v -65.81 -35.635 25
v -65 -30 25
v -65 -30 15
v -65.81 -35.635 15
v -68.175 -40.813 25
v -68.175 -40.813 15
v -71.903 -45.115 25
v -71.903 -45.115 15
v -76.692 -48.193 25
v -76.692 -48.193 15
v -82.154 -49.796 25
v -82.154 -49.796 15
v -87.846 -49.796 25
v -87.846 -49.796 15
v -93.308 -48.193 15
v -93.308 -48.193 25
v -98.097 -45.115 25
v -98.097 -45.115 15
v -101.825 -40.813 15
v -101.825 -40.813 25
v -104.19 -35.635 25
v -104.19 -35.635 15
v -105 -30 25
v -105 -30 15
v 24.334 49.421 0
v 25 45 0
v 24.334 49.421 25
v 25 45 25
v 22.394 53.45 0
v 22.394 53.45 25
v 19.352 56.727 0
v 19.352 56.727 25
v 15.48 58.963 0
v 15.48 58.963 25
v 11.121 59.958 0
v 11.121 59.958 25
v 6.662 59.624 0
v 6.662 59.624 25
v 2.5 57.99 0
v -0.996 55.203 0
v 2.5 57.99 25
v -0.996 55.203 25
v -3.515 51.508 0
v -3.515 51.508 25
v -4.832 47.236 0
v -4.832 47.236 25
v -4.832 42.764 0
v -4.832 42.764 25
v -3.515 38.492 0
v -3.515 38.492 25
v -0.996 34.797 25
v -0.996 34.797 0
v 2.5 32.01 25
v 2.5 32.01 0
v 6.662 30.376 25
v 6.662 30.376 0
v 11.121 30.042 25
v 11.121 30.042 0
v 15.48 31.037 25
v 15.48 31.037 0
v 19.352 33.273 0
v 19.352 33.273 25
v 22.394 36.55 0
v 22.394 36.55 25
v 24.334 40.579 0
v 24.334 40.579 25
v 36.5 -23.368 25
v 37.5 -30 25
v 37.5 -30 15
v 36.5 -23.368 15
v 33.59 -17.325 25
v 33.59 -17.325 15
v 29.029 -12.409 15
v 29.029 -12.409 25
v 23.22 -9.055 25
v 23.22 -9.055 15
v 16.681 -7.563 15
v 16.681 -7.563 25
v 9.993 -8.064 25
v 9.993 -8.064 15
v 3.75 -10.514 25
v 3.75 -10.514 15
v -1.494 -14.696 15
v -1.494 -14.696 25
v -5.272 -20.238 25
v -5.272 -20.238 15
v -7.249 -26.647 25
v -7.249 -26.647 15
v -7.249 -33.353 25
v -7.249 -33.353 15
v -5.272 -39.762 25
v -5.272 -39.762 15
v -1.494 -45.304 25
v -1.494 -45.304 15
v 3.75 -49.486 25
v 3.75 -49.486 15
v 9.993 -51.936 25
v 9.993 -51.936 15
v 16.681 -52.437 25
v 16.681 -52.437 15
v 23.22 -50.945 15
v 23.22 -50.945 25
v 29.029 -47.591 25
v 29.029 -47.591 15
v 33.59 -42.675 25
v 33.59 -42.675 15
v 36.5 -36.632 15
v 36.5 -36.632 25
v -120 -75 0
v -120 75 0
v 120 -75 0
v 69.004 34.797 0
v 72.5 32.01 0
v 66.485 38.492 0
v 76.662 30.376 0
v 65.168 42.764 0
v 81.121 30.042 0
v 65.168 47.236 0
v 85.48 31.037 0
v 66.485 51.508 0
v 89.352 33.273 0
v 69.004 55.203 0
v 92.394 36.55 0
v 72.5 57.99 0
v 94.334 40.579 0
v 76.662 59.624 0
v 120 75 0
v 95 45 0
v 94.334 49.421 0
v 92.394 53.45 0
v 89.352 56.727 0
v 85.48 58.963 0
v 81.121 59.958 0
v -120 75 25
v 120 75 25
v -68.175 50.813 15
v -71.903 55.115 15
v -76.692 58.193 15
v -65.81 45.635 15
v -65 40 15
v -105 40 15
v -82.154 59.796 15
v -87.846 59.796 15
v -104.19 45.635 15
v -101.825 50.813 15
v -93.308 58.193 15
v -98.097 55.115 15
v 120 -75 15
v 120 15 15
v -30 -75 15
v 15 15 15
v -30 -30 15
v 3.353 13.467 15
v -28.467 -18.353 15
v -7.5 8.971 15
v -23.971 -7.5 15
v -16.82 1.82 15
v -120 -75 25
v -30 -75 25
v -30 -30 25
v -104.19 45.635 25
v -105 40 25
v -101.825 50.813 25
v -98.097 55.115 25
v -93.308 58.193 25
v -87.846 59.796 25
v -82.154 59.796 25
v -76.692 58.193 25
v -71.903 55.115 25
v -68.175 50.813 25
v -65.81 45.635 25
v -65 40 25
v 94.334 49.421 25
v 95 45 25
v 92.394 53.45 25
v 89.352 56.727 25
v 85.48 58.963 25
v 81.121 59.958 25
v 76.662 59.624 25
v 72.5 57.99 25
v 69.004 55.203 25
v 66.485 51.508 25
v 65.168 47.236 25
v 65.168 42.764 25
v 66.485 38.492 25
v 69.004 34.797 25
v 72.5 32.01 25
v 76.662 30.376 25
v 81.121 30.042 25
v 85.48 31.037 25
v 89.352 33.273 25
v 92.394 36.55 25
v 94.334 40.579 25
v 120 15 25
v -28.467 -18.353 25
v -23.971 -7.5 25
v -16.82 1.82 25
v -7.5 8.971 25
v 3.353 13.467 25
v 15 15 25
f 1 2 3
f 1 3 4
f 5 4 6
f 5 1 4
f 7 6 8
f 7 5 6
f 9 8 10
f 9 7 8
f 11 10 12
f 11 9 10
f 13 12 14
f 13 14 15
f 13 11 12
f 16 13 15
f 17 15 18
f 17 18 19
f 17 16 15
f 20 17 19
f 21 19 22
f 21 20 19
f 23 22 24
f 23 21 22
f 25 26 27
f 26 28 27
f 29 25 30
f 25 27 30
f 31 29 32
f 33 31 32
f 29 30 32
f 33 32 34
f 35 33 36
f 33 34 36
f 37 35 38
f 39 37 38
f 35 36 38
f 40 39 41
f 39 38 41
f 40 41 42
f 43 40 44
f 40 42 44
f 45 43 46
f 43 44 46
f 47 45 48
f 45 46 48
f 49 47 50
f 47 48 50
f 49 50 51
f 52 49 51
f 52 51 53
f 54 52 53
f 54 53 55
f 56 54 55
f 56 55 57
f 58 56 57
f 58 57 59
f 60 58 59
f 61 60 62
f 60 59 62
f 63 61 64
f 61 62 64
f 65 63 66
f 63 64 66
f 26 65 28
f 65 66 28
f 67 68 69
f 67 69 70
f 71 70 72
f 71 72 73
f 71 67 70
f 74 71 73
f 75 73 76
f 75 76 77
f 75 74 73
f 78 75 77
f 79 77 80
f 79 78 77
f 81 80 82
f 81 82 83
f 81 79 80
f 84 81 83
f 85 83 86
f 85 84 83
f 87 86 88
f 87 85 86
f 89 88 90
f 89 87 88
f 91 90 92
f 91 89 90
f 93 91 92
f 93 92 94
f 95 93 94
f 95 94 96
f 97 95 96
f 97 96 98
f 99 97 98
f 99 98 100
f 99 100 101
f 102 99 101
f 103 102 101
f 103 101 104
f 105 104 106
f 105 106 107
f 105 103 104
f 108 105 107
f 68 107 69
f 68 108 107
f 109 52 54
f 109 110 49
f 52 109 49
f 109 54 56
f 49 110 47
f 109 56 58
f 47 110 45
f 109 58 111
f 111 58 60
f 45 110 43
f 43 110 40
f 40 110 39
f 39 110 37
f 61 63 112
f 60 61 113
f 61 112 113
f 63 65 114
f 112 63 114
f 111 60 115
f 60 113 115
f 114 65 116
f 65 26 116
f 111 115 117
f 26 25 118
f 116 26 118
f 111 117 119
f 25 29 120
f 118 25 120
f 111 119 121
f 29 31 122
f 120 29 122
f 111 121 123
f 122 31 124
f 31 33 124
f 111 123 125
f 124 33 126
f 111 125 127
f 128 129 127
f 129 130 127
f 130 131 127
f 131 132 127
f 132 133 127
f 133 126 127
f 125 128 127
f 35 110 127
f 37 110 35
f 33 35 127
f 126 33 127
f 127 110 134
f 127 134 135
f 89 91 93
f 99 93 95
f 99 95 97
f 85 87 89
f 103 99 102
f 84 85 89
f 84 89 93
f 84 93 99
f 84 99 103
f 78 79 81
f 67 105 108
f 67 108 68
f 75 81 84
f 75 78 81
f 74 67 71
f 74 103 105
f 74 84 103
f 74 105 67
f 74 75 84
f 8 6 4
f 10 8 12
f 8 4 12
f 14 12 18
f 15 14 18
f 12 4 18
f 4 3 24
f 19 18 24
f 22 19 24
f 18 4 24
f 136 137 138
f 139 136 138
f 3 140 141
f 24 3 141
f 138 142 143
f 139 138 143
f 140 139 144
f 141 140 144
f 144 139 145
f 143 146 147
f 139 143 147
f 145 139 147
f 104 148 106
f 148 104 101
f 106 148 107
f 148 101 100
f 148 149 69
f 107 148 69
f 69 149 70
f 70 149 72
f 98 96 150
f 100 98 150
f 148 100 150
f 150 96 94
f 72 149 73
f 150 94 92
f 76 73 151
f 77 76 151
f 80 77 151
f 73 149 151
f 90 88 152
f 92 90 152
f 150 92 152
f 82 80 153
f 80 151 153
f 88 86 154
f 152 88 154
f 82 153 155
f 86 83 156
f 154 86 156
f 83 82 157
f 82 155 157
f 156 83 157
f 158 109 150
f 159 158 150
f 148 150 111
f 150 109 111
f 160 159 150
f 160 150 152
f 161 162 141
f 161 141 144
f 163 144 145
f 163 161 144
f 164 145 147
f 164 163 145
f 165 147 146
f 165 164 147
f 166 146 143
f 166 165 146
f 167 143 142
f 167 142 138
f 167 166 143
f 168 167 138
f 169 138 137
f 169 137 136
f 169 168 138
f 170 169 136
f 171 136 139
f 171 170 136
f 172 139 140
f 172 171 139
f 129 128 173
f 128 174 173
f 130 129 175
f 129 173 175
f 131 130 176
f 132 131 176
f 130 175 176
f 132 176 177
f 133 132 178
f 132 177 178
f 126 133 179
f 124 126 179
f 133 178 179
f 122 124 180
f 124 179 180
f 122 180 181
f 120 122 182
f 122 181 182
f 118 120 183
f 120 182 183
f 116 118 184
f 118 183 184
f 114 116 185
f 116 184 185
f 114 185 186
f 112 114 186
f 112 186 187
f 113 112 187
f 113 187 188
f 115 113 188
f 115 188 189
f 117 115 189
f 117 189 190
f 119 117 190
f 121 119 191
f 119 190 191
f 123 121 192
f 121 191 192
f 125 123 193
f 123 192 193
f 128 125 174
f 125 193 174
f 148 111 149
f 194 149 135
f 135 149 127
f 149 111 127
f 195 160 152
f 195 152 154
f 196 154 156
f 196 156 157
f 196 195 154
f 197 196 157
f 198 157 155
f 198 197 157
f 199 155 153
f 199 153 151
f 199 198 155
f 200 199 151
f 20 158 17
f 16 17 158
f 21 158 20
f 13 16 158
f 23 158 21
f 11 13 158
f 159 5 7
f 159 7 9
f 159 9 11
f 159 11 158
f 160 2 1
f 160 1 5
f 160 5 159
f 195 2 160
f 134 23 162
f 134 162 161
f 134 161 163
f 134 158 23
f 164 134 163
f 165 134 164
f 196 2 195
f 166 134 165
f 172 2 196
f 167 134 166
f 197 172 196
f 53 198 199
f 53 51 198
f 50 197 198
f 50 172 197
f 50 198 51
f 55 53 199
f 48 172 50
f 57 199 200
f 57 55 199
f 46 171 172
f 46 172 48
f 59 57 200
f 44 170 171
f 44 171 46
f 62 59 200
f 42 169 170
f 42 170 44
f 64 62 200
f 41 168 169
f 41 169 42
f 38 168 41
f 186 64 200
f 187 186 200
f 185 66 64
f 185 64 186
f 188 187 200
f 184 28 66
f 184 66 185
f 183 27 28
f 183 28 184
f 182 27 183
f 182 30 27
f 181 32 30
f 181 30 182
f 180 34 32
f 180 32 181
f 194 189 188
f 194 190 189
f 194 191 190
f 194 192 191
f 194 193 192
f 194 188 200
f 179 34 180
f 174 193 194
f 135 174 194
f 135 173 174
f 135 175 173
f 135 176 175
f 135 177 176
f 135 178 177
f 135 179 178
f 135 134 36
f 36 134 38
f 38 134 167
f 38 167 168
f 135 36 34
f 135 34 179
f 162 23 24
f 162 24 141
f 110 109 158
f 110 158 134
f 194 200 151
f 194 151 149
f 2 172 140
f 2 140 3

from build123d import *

# Parameters (mm, degrees)
SKETCH1_W           = 240
SKETCH1_H           = 150
BOSS_EXTRUDE1_DEPTH = 25
SKETCH2_R           = 15
SKETCH2_R_2         = 22.5
CUT_EXTRUDE1_DEPTH  = 10
SKETCH3_R           = 15
CUT_EXTRUDE2_DEPTH  = 143.302494708


with BuildPart() as part:
    # Sketch1 → Boss-Extrude1 (new body)
    with BuildSketch(Plane.XY):
        Rectangle(SKETCH1_W, SKETCH1_H)
    extrude(amount=BOSS_EXTRUDE1_DEPTH)

    # Sketch2 → Cut-Extrude1 (cut)
    # profile 1 of 4: a face of its own
    with BuildSketch(Plane.XY.offset(25)):
        with Locations((10, 45)):
            Circle(SKETCH2_R)
    # profile 2 of 4: a face of its own
    with BuildSketch(Plane.XY.offset(25)):
        with Locations((80, 45)):
            Circle(SKETCH2_R)
    # profile 3 of 4: a face of its own
    with BuildSketch(Plane.XY.offset(25)):
        with BuildLine():
            Line((-105, -30), (-105, 40))
            ThreePointArc((-105, 40), (-85, 60), (-65, 40))
            Line((-65, 40), (-65, -30))
            ThreePointArc((-65, -30), (-85, -50), (-105, -30))
        make_face()
    # profile 4 of 4: a face of its own
    with BuildSketch(Plane.XY.offset(25)):
        with BuildLine():
            Line((15, 15), (120, 15))
            Line((120, 15), (120, -75))
            Line((120, -75), (-30, -75))
            Line((-30, -75), (-30, -30))
            ThreePointArc((-30, -30), (-16.819805153, 1.819805153), (15, 15))
        make_face()
        with Locations((15, -30)):
            Circle(SKETCH2_R_2, mode=Mode.SUBTRACT)
    extrude(amount=-CUT_EXTRUDE1_DEPTH, mode=Mode.SUBTRACT)

    # Sketch3 → Cut-Extrude2 (cut, through all)
    with BuildSketch(Plane.XY.offset(15)):
        with Locations((10, 45)):
            Circle(SKETCH3_R)
        with Locations((80, 45)):
            Circle(SKETCH3_R)
    extrude(amount=-CUT_EXTRUDE2_DEPTH, mode=Mode.SUBTRACT)


solid = part.part
